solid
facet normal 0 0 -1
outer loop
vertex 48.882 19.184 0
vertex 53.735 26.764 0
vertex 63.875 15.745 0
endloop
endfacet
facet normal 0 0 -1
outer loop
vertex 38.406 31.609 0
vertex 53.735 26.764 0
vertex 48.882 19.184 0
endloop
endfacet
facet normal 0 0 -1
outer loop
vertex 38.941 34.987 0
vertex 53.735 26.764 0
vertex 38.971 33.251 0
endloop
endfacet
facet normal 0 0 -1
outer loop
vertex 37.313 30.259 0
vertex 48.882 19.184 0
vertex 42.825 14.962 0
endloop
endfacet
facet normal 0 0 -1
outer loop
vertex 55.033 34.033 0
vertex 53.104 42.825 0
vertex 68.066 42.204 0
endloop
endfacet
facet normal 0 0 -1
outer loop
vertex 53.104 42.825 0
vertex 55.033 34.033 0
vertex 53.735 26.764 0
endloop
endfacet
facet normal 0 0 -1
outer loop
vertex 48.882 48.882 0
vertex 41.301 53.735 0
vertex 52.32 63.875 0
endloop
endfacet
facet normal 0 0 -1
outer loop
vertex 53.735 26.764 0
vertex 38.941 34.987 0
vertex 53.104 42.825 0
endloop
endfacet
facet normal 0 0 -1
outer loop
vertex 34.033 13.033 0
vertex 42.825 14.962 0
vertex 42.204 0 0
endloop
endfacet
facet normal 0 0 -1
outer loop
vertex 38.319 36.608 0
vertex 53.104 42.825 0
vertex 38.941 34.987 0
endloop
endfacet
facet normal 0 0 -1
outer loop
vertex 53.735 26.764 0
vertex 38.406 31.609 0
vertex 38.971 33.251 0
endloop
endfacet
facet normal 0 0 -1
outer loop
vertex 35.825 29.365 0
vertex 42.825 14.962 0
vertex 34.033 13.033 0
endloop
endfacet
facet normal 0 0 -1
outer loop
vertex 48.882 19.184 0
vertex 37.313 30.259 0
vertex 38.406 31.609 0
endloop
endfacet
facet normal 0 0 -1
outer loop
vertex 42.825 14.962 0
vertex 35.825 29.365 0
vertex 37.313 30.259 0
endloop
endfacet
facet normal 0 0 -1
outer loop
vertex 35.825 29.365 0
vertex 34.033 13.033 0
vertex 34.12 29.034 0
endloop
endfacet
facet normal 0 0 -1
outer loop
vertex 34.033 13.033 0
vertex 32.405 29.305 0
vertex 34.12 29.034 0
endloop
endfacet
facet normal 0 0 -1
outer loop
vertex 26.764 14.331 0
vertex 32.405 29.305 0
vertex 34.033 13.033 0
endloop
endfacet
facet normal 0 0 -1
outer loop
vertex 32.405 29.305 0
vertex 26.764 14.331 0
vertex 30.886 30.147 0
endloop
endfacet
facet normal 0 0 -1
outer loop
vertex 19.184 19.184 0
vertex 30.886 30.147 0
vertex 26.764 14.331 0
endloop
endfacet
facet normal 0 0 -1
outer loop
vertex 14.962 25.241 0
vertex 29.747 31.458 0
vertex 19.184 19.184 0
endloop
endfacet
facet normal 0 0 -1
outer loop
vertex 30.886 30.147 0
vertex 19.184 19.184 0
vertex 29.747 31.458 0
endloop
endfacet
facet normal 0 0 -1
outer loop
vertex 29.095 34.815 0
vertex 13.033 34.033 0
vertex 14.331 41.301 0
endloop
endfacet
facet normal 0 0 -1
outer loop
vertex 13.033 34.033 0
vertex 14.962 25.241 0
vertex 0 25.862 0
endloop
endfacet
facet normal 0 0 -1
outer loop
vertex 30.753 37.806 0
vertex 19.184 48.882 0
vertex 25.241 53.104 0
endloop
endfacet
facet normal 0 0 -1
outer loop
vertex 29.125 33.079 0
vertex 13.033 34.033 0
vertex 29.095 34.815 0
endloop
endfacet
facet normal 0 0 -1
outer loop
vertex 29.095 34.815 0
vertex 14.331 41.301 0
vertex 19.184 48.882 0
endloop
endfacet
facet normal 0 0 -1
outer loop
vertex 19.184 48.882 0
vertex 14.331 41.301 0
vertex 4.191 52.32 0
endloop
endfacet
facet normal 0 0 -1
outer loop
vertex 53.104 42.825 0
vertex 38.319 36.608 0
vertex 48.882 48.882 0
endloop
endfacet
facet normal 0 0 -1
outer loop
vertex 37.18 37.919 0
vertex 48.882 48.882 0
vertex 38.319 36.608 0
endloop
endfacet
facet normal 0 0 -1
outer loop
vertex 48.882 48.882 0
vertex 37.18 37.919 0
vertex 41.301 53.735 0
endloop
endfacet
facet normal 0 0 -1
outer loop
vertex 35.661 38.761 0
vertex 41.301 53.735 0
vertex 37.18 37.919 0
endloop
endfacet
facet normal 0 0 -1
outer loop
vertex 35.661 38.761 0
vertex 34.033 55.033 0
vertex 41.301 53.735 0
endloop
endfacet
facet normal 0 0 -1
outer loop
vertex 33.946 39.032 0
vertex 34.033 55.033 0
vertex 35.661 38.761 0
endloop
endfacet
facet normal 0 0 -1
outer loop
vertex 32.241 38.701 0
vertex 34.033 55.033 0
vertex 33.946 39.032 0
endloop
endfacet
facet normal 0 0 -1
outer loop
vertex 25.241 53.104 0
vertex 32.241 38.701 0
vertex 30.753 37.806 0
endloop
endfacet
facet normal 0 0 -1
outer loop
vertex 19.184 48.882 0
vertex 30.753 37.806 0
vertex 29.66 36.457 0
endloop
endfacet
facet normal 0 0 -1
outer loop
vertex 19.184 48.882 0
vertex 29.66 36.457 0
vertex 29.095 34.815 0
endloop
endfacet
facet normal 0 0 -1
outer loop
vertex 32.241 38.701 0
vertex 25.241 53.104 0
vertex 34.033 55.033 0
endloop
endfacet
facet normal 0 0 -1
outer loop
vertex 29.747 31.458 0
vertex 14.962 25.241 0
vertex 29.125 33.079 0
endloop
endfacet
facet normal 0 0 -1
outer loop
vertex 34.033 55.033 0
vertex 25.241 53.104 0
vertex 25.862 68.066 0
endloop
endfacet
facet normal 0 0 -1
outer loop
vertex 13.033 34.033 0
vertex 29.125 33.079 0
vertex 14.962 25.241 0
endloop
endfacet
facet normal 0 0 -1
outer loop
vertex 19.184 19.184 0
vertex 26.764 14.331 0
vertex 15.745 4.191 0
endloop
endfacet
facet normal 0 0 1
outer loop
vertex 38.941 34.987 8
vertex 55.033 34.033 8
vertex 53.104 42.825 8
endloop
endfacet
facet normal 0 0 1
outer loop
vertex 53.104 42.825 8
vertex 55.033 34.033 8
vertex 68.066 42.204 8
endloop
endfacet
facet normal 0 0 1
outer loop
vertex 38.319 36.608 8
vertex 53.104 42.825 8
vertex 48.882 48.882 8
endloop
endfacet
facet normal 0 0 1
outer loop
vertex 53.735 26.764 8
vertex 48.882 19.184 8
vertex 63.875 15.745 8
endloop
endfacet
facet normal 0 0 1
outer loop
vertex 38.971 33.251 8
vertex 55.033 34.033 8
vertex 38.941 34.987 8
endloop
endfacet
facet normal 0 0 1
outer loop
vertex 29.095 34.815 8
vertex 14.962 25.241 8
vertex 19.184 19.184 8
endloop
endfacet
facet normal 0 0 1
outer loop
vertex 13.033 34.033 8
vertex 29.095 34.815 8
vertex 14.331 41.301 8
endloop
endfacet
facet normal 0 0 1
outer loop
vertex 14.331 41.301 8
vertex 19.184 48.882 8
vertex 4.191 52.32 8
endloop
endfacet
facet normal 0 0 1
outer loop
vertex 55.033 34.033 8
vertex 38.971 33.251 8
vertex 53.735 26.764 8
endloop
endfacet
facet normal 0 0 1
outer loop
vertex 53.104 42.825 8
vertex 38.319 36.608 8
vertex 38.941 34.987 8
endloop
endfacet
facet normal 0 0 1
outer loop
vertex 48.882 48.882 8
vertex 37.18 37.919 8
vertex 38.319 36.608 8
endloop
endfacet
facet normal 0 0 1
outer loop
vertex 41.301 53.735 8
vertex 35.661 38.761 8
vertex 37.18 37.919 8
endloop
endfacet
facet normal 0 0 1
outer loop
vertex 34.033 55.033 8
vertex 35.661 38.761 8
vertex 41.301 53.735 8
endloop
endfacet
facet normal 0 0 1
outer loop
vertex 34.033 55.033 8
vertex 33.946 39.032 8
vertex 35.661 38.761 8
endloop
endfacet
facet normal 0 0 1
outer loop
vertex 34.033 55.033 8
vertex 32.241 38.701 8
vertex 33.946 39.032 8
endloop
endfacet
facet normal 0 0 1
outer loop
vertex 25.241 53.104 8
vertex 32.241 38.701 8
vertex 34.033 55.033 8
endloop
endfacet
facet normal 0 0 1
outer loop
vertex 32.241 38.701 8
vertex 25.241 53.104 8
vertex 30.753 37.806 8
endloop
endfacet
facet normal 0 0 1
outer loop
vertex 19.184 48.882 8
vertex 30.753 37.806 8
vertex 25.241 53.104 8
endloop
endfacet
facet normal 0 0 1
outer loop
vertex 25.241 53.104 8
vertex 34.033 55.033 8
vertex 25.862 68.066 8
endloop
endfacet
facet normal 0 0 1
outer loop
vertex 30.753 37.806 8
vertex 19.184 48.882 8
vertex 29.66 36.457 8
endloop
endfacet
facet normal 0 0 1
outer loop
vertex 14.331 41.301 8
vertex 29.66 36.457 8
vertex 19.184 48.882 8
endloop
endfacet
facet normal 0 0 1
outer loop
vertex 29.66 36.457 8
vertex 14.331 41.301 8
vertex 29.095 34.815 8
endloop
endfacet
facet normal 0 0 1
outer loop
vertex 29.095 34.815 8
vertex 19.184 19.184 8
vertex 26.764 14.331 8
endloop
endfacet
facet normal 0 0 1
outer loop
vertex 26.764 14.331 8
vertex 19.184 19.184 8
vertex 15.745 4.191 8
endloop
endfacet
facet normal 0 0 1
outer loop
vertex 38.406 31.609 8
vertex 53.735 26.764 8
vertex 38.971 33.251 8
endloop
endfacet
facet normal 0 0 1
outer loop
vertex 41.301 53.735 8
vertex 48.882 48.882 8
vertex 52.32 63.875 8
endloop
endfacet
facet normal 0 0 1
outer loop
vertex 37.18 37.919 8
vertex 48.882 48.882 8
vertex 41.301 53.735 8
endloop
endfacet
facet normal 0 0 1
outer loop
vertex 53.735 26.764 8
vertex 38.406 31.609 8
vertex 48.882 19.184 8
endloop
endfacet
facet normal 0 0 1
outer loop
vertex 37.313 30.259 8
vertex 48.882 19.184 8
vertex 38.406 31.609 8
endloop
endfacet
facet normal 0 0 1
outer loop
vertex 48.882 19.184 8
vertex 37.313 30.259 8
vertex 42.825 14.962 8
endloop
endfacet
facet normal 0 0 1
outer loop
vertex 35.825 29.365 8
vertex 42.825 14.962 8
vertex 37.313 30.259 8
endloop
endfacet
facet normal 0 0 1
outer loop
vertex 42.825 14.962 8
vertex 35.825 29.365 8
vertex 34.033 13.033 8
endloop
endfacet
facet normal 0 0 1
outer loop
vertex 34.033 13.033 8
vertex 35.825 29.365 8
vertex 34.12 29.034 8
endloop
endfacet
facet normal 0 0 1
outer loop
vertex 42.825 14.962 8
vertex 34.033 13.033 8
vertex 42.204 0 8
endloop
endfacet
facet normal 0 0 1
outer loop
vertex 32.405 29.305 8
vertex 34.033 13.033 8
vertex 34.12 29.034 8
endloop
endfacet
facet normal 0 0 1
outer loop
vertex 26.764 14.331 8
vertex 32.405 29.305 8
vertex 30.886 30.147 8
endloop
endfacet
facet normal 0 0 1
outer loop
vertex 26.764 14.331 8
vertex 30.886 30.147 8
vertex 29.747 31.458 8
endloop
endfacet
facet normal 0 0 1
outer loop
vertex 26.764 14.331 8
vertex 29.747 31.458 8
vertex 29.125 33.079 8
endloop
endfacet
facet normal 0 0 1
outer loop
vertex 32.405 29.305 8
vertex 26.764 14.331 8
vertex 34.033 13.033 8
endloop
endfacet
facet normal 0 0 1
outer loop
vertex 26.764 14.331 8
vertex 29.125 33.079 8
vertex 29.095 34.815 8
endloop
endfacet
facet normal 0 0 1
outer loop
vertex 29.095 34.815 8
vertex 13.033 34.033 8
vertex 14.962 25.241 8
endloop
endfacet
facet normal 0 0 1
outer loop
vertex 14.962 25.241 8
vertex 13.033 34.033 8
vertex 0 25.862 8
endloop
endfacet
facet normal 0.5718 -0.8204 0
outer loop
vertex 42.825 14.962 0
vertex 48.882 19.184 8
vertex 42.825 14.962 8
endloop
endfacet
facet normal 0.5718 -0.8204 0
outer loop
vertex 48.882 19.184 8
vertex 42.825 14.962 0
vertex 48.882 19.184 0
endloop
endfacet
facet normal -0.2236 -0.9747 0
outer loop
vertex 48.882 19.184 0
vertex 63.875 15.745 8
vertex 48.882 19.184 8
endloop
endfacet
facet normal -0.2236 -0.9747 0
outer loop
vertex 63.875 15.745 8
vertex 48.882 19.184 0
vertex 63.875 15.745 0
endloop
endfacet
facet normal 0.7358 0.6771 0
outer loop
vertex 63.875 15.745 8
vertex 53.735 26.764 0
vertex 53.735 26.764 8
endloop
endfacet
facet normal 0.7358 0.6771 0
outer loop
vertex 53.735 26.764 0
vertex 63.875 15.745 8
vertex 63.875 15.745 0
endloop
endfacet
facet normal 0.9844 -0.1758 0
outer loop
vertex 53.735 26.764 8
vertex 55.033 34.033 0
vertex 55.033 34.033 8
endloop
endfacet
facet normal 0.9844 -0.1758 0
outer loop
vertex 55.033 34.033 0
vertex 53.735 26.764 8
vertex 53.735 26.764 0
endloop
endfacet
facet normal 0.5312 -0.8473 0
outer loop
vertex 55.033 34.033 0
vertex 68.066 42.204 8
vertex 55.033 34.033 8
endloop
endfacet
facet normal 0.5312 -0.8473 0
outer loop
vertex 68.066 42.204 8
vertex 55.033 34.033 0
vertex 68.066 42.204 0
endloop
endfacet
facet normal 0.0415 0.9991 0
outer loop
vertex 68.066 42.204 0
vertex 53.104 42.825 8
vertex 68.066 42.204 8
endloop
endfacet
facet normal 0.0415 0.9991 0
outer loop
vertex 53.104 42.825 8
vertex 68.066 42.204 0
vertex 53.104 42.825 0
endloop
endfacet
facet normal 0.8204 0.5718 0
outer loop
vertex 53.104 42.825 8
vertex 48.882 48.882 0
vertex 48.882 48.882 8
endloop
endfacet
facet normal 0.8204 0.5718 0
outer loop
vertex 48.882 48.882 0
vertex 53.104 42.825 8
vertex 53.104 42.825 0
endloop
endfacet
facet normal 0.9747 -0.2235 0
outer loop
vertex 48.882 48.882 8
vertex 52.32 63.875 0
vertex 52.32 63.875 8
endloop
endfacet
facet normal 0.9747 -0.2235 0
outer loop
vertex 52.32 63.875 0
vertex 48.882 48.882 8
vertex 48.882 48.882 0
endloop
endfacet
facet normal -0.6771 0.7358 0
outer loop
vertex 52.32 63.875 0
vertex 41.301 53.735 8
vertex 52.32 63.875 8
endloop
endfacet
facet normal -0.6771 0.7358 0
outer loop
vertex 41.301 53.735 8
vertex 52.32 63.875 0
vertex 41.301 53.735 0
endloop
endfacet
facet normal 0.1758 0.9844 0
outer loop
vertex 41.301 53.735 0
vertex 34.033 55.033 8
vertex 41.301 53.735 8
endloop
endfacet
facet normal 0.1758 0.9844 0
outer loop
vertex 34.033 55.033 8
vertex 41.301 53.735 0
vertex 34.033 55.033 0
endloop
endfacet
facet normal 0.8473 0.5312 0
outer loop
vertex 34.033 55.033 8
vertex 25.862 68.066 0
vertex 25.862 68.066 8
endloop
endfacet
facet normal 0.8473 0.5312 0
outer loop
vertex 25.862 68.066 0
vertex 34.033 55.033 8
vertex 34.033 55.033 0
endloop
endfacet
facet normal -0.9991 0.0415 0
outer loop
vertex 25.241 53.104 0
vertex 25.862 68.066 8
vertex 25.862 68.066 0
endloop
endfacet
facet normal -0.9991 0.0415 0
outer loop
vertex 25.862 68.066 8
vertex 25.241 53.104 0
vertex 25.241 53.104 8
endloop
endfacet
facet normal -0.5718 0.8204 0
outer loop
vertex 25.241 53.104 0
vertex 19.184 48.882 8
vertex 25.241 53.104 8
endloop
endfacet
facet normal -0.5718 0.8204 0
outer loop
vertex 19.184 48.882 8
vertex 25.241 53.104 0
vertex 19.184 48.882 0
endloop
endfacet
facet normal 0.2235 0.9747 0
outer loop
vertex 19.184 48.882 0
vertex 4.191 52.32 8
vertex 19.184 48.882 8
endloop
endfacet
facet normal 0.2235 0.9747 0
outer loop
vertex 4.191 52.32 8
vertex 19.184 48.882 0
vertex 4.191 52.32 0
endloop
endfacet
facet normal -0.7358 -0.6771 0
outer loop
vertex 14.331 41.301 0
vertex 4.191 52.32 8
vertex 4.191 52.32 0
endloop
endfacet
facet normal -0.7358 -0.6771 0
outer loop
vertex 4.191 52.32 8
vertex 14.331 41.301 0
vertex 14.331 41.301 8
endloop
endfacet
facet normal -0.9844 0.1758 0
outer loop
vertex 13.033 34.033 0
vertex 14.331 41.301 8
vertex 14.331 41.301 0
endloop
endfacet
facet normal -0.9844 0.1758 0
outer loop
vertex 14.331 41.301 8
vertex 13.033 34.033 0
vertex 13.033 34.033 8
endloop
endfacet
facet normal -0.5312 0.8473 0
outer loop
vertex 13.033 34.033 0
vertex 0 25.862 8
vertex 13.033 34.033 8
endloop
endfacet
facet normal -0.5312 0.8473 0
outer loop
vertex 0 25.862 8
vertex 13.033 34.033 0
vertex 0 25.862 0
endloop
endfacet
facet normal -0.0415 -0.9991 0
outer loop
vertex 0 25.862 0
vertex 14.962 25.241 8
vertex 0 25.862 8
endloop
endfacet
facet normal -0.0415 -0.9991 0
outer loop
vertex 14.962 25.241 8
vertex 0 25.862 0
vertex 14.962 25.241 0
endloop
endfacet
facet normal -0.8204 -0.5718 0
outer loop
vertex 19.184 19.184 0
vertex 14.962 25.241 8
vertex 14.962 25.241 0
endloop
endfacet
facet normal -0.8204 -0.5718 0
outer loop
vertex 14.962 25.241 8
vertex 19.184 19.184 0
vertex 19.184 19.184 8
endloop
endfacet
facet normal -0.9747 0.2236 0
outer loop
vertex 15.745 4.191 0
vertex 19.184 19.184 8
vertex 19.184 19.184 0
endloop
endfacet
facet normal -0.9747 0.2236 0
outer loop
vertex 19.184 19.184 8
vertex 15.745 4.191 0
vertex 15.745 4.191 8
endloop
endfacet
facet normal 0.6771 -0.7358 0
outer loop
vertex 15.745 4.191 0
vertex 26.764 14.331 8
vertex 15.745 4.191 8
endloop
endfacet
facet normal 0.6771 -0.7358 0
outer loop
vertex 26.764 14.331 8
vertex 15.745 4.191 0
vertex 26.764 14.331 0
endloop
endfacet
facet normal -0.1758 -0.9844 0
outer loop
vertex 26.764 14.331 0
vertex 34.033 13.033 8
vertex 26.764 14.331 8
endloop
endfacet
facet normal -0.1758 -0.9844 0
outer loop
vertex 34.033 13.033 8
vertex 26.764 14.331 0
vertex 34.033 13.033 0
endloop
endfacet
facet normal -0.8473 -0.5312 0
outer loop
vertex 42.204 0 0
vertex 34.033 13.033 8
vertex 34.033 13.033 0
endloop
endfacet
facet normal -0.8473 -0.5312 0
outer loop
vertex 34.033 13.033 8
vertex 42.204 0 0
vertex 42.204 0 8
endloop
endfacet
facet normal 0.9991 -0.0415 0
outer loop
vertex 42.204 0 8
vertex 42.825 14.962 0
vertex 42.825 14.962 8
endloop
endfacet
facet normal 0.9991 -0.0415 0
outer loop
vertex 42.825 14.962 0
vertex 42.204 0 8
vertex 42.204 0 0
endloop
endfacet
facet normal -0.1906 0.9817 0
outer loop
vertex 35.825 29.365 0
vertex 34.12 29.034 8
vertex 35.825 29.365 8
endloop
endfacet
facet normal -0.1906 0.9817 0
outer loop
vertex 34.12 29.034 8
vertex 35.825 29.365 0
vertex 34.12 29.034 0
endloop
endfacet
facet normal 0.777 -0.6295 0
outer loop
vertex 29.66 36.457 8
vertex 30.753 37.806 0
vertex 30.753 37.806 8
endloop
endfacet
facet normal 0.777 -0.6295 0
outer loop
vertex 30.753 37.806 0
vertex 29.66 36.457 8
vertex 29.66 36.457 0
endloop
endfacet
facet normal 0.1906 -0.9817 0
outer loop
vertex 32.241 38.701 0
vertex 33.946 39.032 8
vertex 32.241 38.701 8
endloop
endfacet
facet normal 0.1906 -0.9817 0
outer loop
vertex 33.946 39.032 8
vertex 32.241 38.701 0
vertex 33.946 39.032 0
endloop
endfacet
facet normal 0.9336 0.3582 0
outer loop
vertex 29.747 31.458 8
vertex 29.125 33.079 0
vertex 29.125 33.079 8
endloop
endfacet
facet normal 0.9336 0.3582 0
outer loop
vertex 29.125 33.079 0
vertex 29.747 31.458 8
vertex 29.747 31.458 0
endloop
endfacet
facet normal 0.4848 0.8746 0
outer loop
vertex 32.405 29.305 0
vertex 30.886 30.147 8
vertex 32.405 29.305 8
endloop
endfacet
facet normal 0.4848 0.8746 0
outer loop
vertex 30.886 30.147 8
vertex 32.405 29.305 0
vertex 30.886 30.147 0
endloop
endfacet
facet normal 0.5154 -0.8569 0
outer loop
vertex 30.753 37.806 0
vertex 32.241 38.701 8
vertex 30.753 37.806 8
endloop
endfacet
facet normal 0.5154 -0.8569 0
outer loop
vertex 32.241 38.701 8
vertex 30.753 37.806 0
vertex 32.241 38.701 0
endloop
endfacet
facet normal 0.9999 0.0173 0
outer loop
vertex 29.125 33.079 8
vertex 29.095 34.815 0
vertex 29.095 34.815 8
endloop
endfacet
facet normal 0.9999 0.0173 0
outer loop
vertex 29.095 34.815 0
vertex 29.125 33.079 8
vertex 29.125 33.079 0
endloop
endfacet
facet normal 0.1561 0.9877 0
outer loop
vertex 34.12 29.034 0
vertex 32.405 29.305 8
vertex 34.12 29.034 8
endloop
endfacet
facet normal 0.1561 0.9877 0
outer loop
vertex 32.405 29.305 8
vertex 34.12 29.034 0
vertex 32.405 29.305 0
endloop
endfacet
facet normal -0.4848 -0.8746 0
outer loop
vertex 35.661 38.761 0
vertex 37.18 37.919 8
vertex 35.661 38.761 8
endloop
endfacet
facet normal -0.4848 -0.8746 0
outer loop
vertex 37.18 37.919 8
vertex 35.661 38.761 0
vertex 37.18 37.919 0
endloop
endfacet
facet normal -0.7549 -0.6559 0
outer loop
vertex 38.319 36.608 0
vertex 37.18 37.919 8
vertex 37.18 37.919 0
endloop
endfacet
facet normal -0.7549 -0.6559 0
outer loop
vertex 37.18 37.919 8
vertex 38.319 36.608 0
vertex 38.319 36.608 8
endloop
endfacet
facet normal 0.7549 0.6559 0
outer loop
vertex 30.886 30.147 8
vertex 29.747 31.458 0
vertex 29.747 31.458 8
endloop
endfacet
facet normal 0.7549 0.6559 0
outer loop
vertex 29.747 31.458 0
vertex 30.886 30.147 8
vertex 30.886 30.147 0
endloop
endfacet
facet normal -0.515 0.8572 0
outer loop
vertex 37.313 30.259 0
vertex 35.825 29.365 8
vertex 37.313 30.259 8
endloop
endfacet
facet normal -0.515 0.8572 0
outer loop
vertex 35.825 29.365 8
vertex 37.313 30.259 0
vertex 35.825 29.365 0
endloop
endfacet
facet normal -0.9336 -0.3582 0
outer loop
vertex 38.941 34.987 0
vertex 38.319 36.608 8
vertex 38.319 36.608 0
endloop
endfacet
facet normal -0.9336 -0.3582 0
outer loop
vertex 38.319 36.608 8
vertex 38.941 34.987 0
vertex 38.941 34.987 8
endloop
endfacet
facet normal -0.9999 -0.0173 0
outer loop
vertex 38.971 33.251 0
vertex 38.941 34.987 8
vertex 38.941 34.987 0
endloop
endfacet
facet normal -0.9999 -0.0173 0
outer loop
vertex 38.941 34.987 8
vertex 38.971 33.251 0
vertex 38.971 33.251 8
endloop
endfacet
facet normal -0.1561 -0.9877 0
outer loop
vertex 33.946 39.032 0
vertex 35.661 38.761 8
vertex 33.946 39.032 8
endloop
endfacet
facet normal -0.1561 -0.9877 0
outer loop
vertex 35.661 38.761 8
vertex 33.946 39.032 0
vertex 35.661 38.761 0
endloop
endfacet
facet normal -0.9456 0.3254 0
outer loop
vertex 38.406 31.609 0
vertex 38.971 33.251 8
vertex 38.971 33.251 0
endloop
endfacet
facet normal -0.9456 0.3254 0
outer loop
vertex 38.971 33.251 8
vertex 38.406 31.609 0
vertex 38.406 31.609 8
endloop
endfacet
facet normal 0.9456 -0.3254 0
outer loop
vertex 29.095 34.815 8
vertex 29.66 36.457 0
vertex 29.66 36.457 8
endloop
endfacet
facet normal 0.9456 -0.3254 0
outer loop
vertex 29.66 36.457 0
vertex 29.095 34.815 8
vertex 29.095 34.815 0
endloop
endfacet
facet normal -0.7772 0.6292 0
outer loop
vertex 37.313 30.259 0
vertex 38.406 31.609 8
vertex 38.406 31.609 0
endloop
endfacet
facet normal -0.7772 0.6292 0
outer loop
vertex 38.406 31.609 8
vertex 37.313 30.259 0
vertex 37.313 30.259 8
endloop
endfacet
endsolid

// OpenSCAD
$fn = 32;

// ----------------------------------------------------------------------
// Star wheel: 8-point ratchet, R35
// ----------------------------------------------------------------------

// --- parameters (mm) ---
n_points = 8;             // number of points / teeth
r_out = 35;               // tip radius
r_in = 21;                // root radius
bore_r = 5;               // centre bore radius
plate_t = 8;              // plate thickness, Z (extrusion height)
bore_d = 10;              // centre bore diameter

profile = [[13.033, 34.033], [0, 25.862], [14.962, 25.241], [19.184, 19.184], [15.745, 4.191], [26.764, 14.331], [34.033, 13.033], [42.204, 0], [42.825, 14.962], [48.882, 19.184], [63.875, 15.745], [53.735, 26.764], [55.033, 34.033], [68.066, 42.204], [53.104, 42.825], [48.882, 48.882], [52.32, 63.875], [41.301, 53.735], [34.033, 55.033], [25.862, 68.066], [25.241, 53.104], [19.184, 48.882], [4.191, 52.32], [14.331, 41.301]];  // primary outline, 24 points, counter clockwise
void_1 = [[38.941, 34.987], [38.319, 36.608], [37.18, 37.919], [35.661, 38.761], [33.946, 39.032], [32.241, 38.701], [30.753, 37.806], [29.66, 36.457], [29.095, 34.815], [29.125, 33.079], [29.747, 31.458], [30.886, 30.147], [32.405, 29.305], [34.12, 29.034], [35.825, 29.365], [37.313, 30.259], [38.406, 31.609], [38.971, 33.251]];  // centre bore, 18 points

// --- the one profile operation ---
difference() {
  linear_extrude(height = plate_t) polygon(points = profile);
  translate([0, 0, -1])
    linear_extrude(height = plate_t + 2) polygon(points = void_1);
}
